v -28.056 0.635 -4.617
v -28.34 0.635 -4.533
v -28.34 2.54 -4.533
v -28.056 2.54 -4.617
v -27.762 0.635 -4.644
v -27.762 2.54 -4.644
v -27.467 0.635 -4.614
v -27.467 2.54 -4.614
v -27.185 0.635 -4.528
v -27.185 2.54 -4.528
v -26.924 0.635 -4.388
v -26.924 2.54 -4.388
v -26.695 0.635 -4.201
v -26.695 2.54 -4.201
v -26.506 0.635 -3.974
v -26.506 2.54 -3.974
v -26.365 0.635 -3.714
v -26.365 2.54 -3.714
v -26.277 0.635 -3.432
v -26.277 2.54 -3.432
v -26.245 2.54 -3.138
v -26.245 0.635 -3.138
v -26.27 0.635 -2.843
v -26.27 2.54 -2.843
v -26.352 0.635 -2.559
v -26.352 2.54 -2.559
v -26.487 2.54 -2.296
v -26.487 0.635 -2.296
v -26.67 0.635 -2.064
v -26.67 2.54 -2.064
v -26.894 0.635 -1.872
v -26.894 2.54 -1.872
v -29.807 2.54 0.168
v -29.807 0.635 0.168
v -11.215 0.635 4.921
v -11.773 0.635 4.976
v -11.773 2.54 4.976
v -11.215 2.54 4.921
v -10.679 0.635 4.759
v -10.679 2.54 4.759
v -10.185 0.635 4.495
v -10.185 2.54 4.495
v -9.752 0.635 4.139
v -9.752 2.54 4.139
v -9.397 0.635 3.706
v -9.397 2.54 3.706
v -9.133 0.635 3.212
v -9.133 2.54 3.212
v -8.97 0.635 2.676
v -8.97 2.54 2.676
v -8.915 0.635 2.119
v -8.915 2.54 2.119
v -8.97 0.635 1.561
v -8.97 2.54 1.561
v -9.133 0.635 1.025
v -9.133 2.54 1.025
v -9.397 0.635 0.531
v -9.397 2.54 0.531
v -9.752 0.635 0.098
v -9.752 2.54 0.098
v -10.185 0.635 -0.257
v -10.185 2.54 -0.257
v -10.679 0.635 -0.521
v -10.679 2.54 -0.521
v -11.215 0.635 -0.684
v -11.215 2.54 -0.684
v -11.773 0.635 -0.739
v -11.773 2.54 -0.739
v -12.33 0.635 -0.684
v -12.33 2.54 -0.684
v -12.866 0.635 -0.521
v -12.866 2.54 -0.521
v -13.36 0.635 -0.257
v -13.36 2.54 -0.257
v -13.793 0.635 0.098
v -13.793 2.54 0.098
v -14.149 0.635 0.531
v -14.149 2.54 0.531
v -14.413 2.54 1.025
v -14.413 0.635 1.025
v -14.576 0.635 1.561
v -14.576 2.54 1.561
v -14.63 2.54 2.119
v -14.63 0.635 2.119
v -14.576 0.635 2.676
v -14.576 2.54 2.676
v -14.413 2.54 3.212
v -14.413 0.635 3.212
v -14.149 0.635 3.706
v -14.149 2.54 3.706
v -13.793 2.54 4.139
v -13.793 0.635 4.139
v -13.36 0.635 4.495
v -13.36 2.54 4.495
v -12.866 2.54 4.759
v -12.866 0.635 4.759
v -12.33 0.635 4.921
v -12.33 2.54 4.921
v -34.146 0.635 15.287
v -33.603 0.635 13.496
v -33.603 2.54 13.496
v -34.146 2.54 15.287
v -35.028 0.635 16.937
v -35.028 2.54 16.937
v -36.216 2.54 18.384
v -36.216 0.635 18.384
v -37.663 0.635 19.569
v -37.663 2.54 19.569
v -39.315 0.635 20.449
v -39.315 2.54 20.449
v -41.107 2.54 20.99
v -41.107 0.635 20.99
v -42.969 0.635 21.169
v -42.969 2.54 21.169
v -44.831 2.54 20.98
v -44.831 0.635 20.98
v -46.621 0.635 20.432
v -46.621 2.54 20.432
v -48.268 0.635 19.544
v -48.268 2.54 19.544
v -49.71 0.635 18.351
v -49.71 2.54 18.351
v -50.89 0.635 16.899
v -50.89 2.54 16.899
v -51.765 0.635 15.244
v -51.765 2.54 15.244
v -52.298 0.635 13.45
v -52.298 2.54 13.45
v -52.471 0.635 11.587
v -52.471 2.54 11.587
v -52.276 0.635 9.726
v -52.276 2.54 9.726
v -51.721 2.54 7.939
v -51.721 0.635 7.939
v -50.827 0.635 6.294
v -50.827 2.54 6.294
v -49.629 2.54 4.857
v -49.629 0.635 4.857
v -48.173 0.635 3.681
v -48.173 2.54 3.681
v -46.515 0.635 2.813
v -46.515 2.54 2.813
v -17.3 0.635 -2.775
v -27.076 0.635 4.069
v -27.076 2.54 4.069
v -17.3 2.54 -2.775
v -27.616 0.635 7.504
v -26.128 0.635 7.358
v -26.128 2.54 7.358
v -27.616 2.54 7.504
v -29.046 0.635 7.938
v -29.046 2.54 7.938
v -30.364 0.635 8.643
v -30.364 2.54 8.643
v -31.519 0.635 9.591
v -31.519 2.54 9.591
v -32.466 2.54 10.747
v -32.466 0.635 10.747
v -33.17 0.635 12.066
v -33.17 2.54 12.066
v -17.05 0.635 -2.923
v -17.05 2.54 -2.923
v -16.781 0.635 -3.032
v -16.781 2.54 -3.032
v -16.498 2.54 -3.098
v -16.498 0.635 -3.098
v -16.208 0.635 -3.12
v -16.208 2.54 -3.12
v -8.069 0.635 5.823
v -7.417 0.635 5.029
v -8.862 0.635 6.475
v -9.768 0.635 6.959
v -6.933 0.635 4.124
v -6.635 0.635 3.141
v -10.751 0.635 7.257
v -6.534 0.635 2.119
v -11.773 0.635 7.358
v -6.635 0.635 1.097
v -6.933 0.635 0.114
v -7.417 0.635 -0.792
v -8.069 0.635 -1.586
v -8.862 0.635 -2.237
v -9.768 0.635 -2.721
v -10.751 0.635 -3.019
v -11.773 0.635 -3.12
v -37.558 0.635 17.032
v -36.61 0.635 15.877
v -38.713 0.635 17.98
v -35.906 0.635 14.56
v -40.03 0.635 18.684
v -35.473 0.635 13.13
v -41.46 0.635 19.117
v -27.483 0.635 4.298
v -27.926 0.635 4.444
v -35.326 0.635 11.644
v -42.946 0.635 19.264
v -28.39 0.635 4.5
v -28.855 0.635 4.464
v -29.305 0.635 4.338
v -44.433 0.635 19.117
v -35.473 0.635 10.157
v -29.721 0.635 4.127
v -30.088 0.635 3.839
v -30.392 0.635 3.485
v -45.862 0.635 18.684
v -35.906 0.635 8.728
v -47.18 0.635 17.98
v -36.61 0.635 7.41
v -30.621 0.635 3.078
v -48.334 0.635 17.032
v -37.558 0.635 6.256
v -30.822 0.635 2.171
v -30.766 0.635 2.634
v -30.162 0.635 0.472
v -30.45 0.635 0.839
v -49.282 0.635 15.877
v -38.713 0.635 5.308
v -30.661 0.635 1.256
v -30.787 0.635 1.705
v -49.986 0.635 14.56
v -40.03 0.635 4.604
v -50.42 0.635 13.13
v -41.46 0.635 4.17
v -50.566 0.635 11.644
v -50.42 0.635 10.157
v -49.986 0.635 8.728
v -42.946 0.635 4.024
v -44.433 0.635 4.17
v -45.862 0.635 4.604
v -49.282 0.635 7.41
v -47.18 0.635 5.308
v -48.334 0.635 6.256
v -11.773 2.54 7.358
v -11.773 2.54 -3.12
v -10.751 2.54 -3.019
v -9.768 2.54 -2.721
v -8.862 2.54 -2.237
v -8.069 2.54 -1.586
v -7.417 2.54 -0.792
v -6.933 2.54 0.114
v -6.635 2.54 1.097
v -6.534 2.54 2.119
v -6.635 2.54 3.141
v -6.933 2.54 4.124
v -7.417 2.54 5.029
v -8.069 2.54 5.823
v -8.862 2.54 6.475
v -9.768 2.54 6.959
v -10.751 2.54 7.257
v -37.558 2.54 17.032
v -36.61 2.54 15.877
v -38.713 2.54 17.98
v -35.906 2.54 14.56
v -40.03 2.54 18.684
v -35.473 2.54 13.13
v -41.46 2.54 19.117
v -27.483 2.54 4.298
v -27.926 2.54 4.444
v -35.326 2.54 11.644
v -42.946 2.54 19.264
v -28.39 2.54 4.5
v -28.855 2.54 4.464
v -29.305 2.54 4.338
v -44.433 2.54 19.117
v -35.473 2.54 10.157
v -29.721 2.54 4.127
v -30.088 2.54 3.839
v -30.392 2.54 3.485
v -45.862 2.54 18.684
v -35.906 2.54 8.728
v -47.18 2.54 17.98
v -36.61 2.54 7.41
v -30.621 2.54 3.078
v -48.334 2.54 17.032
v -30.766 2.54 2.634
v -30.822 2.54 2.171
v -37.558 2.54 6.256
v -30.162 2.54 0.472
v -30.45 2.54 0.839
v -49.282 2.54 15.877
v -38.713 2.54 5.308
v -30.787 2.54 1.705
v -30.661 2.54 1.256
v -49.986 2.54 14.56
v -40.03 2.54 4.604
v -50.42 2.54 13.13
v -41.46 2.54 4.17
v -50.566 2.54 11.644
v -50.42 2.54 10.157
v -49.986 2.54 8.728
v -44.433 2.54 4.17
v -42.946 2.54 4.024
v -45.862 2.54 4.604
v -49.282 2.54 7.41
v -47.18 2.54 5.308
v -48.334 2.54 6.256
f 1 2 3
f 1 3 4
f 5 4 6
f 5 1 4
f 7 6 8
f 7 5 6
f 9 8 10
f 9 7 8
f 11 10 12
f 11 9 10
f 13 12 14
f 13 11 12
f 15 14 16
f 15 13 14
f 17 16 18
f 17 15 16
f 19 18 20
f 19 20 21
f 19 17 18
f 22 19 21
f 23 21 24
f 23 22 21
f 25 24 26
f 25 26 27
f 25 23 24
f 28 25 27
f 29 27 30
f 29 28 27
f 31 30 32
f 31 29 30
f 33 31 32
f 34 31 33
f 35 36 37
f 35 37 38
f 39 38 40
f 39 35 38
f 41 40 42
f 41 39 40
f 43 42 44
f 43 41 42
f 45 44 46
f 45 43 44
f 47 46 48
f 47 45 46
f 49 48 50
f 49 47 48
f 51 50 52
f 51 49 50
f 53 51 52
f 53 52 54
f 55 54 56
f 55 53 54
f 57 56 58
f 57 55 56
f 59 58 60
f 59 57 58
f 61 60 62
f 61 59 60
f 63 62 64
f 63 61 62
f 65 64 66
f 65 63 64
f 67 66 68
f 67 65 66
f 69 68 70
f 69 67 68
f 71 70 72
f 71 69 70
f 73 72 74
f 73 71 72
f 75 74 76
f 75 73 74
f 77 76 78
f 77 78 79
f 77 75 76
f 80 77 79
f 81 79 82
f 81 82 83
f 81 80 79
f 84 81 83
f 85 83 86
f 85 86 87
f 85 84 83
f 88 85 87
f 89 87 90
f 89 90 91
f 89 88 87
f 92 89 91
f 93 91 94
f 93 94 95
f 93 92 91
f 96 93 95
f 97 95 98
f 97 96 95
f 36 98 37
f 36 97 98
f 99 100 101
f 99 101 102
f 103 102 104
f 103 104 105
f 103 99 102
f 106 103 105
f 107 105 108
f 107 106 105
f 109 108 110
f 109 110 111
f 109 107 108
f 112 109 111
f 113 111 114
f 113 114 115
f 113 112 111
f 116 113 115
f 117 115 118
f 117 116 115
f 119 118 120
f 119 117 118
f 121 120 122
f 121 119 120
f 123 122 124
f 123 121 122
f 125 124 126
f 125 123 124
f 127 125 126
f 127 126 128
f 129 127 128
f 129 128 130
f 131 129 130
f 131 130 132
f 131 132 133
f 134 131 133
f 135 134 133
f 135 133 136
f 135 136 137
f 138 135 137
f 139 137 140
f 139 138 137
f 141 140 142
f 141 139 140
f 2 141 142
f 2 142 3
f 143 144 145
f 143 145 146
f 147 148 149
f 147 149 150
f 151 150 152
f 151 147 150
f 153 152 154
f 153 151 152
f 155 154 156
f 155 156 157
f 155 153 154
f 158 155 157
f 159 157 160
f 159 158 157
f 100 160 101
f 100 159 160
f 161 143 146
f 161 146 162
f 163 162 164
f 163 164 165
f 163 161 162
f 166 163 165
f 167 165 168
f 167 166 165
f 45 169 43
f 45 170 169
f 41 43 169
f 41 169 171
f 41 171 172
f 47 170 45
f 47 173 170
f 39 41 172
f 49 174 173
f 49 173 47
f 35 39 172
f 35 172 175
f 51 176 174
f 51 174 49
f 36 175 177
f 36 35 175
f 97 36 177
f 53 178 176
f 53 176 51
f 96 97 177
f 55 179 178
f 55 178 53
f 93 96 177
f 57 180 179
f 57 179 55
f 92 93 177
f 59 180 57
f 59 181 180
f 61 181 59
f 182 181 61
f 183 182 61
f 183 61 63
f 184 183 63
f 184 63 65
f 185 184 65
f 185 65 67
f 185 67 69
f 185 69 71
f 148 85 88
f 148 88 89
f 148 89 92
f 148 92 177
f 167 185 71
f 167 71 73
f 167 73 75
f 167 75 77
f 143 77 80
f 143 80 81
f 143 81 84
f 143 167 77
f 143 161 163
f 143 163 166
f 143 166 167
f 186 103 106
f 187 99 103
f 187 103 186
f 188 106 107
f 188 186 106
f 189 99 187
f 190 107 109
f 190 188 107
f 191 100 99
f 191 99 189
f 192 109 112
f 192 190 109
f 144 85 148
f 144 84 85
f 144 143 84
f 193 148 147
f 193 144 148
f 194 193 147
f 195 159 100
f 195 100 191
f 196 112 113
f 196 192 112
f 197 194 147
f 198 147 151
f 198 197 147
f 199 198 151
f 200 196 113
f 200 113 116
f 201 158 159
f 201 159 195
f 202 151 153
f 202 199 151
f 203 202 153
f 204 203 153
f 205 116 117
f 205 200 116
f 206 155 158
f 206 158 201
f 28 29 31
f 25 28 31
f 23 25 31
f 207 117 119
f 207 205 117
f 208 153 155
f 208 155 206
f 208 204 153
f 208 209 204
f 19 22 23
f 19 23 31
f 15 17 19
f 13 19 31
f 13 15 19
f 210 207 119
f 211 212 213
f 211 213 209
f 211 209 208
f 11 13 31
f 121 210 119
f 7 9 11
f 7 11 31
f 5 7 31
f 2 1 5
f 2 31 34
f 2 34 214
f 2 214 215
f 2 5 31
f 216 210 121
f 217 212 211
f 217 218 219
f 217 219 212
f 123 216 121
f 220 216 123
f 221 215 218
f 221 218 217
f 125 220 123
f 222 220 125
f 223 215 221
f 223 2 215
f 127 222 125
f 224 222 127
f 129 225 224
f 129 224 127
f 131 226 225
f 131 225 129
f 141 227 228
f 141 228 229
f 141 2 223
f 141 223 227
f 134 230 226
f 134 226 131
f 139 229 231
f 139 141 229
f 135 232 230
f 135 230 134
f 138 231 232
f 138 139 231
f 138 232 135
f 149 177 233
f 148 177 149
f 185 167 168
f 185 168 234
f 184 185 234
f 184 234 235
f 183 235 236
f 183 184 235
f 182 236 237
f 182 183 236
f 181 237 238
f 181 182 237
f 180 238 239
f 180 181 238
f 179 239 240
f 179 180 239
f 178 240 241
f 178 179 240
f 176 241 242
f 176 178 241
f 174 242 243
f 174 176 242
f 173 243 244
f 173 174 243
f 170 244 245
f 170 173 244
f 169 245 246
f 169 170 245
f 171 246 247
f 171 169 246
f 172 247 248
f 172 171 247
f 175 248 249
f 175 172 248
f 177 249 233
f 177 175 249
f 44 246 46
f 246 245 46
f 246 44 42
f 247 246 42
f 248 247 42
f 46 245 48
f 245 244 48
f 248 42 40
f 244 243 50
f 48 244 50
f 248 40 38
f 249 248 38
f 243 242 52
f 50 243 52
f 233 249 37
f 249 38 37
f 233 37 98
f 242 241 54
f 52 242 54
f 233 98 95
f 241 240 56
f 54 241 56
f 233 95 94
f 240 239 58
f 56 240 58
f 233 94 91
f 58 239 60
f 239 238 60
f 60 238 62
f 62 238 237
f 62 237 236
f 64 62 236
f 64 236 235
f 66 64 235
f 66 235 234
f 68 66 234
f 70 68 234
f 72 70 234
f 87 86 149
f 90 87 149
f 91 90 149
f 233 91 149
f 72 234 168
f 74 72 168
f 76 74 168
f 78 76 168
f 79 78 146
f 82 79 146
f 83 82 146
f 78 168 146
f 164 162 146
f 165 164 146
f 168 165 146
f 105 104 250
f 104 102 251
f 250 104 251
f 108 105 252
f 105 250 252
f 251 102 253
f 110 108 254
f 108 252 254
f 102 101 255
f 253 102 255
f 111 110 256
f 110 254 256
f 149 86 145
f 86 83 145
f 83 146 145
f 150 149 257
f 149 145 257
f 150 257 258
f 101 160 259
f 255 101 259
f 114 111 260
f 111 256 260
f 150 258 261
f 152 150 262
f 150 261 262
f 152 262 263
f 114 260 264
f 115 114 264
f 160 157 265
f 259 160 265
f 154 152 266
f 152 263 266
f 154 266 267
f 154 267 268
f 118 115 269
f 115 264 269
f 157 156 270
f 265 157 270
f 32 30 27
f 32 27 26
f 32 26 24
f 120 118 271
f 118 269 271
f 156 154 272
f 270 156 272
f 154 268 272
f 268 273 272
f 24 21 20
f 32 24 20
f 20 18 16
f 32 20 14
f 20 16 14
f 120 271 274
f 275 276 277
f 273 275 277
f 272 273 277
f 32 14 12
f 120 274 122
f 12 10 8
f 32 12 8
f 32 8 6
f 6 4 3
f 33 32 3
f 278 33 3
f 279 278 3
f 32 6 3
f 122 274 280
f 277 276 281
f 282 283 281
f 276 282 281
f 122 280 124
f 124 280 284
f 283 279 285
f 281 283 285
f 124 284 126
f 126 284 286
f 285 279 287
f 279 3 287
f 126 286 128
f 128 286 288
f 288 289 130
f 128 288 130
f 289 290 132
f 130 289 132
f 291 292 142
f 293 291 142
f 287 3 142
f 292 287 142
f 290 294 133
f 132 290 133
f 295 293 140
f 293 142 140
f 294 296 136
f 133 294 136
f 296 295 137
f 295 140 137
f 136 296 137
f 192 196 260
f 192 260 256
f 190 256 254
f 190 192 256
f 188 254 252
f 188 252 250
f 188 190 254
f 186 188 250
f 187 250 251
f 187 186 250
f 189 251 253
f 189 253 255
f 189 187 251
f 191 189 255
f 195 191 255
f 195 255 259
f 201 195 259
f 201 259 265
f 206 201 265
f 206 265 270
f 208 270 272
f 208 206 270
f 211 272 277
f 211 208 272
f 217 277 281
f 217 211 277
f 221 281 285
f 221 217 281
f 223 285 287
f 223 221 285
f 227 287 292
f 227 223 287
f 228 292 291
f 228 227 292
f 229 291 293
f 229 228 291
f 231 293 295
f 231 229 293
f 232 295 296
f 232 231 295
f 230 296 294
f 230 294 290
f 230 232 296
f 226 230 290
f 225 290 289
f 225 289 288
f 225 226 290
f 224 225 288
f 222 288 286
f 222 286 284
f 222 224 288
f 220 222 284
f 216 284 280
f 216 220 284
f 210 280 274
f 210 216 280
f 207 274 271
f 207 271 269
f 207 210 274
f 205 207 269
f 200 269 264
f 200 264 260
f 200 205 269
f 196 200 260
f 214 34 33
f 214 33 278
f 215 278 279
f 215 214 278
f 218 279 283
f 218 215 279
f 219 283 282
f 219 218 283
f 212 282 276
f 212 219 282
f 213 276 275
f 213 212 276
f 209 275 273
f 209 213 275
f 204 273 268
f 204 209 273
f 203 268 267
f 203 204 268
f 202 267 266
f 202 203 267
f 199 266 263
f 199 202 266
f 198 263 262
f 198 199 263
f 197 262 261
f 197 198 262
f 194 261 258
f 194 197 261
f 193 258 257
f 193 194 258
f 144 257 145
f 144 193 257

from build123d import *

# Parameters (mm, degrees)
SKETCH1_R           = 4.7625
SKETCH1_R_2         = 12.7
BOSS_EXTRUDE1_DEPTH = 3.175
SCALE1_SCALE        = 0.6


with BuildPart() as part:
    # Sketch1 → Boss-Extrude1 (new body)
    with BuildSketch(Plane(origin=(0, 0, 0), x_dir=(1, 0, 0), z_dir=(0, 1, 0))):
        with BuildLine():
            Line((0, -8.73125), (-23.925972084, -8.73125))
            ThreePointArc((-23.925972084, -8.73125), (-31.985998621, -11.616670426), (-36.383573946, -18.961805556))
            ThreePointArc((-36.383573946, -18.961805556), (-62.075355484, -28.106340634), (-57.903987761, -1.156575296))
            Line((-57.903987761, -1.156575296), (-27.611137885, 11.086197953))
            ThreePointArc((-27.611137885, 11.086197953), (-24.427259651, 9.943349405), (-25.202507899, 6.650603808))
            Line((-25.202507899, 6.650603808), (-30.057631482, 3.251009676))
            ThreePointArc((-30.057631482, 3.251009676), (-31.032259676, -2.276381482), (-25.504868518, -3.251009676))
            Line((-25.504868518, -3.251009676), (-9.212459777, 8.157057741))
            ThreePointArc((-9.212459777, 8.157057741), (-8.346095505, 8.584301319), (-7.391354591, 8.73125))
            Line((-7.391354591, 8.73125), (0, 8.73125))
            ThreePointArc((0, 8.73125), (8.73125, 0), (0, -8.73125))
        make_face()
        with Locations(Location((0, 0, 0), (0, 0, 270))):
            Circle(SKETCH1_R, mode=Mode.SUBTRACT)
        with Locations(Location((-51.955576272, -15.875, 0), (0, 0, 270))):
            Circle(SKETCH1_R_2, mode=Mode.SUBTRACT)
    extrude(amount=BOSS_EXTRUDE1_DEPTH)


with BuildPart() as part_1:
    # Scale1: scaled about (-29.432275391, 1.5875, 5.297099312)
    add(part.part.scale(SCALE1_SCALE).moved(Location((-11.772910156, 0.635, 2.118839725))))


solid = part_1.part
